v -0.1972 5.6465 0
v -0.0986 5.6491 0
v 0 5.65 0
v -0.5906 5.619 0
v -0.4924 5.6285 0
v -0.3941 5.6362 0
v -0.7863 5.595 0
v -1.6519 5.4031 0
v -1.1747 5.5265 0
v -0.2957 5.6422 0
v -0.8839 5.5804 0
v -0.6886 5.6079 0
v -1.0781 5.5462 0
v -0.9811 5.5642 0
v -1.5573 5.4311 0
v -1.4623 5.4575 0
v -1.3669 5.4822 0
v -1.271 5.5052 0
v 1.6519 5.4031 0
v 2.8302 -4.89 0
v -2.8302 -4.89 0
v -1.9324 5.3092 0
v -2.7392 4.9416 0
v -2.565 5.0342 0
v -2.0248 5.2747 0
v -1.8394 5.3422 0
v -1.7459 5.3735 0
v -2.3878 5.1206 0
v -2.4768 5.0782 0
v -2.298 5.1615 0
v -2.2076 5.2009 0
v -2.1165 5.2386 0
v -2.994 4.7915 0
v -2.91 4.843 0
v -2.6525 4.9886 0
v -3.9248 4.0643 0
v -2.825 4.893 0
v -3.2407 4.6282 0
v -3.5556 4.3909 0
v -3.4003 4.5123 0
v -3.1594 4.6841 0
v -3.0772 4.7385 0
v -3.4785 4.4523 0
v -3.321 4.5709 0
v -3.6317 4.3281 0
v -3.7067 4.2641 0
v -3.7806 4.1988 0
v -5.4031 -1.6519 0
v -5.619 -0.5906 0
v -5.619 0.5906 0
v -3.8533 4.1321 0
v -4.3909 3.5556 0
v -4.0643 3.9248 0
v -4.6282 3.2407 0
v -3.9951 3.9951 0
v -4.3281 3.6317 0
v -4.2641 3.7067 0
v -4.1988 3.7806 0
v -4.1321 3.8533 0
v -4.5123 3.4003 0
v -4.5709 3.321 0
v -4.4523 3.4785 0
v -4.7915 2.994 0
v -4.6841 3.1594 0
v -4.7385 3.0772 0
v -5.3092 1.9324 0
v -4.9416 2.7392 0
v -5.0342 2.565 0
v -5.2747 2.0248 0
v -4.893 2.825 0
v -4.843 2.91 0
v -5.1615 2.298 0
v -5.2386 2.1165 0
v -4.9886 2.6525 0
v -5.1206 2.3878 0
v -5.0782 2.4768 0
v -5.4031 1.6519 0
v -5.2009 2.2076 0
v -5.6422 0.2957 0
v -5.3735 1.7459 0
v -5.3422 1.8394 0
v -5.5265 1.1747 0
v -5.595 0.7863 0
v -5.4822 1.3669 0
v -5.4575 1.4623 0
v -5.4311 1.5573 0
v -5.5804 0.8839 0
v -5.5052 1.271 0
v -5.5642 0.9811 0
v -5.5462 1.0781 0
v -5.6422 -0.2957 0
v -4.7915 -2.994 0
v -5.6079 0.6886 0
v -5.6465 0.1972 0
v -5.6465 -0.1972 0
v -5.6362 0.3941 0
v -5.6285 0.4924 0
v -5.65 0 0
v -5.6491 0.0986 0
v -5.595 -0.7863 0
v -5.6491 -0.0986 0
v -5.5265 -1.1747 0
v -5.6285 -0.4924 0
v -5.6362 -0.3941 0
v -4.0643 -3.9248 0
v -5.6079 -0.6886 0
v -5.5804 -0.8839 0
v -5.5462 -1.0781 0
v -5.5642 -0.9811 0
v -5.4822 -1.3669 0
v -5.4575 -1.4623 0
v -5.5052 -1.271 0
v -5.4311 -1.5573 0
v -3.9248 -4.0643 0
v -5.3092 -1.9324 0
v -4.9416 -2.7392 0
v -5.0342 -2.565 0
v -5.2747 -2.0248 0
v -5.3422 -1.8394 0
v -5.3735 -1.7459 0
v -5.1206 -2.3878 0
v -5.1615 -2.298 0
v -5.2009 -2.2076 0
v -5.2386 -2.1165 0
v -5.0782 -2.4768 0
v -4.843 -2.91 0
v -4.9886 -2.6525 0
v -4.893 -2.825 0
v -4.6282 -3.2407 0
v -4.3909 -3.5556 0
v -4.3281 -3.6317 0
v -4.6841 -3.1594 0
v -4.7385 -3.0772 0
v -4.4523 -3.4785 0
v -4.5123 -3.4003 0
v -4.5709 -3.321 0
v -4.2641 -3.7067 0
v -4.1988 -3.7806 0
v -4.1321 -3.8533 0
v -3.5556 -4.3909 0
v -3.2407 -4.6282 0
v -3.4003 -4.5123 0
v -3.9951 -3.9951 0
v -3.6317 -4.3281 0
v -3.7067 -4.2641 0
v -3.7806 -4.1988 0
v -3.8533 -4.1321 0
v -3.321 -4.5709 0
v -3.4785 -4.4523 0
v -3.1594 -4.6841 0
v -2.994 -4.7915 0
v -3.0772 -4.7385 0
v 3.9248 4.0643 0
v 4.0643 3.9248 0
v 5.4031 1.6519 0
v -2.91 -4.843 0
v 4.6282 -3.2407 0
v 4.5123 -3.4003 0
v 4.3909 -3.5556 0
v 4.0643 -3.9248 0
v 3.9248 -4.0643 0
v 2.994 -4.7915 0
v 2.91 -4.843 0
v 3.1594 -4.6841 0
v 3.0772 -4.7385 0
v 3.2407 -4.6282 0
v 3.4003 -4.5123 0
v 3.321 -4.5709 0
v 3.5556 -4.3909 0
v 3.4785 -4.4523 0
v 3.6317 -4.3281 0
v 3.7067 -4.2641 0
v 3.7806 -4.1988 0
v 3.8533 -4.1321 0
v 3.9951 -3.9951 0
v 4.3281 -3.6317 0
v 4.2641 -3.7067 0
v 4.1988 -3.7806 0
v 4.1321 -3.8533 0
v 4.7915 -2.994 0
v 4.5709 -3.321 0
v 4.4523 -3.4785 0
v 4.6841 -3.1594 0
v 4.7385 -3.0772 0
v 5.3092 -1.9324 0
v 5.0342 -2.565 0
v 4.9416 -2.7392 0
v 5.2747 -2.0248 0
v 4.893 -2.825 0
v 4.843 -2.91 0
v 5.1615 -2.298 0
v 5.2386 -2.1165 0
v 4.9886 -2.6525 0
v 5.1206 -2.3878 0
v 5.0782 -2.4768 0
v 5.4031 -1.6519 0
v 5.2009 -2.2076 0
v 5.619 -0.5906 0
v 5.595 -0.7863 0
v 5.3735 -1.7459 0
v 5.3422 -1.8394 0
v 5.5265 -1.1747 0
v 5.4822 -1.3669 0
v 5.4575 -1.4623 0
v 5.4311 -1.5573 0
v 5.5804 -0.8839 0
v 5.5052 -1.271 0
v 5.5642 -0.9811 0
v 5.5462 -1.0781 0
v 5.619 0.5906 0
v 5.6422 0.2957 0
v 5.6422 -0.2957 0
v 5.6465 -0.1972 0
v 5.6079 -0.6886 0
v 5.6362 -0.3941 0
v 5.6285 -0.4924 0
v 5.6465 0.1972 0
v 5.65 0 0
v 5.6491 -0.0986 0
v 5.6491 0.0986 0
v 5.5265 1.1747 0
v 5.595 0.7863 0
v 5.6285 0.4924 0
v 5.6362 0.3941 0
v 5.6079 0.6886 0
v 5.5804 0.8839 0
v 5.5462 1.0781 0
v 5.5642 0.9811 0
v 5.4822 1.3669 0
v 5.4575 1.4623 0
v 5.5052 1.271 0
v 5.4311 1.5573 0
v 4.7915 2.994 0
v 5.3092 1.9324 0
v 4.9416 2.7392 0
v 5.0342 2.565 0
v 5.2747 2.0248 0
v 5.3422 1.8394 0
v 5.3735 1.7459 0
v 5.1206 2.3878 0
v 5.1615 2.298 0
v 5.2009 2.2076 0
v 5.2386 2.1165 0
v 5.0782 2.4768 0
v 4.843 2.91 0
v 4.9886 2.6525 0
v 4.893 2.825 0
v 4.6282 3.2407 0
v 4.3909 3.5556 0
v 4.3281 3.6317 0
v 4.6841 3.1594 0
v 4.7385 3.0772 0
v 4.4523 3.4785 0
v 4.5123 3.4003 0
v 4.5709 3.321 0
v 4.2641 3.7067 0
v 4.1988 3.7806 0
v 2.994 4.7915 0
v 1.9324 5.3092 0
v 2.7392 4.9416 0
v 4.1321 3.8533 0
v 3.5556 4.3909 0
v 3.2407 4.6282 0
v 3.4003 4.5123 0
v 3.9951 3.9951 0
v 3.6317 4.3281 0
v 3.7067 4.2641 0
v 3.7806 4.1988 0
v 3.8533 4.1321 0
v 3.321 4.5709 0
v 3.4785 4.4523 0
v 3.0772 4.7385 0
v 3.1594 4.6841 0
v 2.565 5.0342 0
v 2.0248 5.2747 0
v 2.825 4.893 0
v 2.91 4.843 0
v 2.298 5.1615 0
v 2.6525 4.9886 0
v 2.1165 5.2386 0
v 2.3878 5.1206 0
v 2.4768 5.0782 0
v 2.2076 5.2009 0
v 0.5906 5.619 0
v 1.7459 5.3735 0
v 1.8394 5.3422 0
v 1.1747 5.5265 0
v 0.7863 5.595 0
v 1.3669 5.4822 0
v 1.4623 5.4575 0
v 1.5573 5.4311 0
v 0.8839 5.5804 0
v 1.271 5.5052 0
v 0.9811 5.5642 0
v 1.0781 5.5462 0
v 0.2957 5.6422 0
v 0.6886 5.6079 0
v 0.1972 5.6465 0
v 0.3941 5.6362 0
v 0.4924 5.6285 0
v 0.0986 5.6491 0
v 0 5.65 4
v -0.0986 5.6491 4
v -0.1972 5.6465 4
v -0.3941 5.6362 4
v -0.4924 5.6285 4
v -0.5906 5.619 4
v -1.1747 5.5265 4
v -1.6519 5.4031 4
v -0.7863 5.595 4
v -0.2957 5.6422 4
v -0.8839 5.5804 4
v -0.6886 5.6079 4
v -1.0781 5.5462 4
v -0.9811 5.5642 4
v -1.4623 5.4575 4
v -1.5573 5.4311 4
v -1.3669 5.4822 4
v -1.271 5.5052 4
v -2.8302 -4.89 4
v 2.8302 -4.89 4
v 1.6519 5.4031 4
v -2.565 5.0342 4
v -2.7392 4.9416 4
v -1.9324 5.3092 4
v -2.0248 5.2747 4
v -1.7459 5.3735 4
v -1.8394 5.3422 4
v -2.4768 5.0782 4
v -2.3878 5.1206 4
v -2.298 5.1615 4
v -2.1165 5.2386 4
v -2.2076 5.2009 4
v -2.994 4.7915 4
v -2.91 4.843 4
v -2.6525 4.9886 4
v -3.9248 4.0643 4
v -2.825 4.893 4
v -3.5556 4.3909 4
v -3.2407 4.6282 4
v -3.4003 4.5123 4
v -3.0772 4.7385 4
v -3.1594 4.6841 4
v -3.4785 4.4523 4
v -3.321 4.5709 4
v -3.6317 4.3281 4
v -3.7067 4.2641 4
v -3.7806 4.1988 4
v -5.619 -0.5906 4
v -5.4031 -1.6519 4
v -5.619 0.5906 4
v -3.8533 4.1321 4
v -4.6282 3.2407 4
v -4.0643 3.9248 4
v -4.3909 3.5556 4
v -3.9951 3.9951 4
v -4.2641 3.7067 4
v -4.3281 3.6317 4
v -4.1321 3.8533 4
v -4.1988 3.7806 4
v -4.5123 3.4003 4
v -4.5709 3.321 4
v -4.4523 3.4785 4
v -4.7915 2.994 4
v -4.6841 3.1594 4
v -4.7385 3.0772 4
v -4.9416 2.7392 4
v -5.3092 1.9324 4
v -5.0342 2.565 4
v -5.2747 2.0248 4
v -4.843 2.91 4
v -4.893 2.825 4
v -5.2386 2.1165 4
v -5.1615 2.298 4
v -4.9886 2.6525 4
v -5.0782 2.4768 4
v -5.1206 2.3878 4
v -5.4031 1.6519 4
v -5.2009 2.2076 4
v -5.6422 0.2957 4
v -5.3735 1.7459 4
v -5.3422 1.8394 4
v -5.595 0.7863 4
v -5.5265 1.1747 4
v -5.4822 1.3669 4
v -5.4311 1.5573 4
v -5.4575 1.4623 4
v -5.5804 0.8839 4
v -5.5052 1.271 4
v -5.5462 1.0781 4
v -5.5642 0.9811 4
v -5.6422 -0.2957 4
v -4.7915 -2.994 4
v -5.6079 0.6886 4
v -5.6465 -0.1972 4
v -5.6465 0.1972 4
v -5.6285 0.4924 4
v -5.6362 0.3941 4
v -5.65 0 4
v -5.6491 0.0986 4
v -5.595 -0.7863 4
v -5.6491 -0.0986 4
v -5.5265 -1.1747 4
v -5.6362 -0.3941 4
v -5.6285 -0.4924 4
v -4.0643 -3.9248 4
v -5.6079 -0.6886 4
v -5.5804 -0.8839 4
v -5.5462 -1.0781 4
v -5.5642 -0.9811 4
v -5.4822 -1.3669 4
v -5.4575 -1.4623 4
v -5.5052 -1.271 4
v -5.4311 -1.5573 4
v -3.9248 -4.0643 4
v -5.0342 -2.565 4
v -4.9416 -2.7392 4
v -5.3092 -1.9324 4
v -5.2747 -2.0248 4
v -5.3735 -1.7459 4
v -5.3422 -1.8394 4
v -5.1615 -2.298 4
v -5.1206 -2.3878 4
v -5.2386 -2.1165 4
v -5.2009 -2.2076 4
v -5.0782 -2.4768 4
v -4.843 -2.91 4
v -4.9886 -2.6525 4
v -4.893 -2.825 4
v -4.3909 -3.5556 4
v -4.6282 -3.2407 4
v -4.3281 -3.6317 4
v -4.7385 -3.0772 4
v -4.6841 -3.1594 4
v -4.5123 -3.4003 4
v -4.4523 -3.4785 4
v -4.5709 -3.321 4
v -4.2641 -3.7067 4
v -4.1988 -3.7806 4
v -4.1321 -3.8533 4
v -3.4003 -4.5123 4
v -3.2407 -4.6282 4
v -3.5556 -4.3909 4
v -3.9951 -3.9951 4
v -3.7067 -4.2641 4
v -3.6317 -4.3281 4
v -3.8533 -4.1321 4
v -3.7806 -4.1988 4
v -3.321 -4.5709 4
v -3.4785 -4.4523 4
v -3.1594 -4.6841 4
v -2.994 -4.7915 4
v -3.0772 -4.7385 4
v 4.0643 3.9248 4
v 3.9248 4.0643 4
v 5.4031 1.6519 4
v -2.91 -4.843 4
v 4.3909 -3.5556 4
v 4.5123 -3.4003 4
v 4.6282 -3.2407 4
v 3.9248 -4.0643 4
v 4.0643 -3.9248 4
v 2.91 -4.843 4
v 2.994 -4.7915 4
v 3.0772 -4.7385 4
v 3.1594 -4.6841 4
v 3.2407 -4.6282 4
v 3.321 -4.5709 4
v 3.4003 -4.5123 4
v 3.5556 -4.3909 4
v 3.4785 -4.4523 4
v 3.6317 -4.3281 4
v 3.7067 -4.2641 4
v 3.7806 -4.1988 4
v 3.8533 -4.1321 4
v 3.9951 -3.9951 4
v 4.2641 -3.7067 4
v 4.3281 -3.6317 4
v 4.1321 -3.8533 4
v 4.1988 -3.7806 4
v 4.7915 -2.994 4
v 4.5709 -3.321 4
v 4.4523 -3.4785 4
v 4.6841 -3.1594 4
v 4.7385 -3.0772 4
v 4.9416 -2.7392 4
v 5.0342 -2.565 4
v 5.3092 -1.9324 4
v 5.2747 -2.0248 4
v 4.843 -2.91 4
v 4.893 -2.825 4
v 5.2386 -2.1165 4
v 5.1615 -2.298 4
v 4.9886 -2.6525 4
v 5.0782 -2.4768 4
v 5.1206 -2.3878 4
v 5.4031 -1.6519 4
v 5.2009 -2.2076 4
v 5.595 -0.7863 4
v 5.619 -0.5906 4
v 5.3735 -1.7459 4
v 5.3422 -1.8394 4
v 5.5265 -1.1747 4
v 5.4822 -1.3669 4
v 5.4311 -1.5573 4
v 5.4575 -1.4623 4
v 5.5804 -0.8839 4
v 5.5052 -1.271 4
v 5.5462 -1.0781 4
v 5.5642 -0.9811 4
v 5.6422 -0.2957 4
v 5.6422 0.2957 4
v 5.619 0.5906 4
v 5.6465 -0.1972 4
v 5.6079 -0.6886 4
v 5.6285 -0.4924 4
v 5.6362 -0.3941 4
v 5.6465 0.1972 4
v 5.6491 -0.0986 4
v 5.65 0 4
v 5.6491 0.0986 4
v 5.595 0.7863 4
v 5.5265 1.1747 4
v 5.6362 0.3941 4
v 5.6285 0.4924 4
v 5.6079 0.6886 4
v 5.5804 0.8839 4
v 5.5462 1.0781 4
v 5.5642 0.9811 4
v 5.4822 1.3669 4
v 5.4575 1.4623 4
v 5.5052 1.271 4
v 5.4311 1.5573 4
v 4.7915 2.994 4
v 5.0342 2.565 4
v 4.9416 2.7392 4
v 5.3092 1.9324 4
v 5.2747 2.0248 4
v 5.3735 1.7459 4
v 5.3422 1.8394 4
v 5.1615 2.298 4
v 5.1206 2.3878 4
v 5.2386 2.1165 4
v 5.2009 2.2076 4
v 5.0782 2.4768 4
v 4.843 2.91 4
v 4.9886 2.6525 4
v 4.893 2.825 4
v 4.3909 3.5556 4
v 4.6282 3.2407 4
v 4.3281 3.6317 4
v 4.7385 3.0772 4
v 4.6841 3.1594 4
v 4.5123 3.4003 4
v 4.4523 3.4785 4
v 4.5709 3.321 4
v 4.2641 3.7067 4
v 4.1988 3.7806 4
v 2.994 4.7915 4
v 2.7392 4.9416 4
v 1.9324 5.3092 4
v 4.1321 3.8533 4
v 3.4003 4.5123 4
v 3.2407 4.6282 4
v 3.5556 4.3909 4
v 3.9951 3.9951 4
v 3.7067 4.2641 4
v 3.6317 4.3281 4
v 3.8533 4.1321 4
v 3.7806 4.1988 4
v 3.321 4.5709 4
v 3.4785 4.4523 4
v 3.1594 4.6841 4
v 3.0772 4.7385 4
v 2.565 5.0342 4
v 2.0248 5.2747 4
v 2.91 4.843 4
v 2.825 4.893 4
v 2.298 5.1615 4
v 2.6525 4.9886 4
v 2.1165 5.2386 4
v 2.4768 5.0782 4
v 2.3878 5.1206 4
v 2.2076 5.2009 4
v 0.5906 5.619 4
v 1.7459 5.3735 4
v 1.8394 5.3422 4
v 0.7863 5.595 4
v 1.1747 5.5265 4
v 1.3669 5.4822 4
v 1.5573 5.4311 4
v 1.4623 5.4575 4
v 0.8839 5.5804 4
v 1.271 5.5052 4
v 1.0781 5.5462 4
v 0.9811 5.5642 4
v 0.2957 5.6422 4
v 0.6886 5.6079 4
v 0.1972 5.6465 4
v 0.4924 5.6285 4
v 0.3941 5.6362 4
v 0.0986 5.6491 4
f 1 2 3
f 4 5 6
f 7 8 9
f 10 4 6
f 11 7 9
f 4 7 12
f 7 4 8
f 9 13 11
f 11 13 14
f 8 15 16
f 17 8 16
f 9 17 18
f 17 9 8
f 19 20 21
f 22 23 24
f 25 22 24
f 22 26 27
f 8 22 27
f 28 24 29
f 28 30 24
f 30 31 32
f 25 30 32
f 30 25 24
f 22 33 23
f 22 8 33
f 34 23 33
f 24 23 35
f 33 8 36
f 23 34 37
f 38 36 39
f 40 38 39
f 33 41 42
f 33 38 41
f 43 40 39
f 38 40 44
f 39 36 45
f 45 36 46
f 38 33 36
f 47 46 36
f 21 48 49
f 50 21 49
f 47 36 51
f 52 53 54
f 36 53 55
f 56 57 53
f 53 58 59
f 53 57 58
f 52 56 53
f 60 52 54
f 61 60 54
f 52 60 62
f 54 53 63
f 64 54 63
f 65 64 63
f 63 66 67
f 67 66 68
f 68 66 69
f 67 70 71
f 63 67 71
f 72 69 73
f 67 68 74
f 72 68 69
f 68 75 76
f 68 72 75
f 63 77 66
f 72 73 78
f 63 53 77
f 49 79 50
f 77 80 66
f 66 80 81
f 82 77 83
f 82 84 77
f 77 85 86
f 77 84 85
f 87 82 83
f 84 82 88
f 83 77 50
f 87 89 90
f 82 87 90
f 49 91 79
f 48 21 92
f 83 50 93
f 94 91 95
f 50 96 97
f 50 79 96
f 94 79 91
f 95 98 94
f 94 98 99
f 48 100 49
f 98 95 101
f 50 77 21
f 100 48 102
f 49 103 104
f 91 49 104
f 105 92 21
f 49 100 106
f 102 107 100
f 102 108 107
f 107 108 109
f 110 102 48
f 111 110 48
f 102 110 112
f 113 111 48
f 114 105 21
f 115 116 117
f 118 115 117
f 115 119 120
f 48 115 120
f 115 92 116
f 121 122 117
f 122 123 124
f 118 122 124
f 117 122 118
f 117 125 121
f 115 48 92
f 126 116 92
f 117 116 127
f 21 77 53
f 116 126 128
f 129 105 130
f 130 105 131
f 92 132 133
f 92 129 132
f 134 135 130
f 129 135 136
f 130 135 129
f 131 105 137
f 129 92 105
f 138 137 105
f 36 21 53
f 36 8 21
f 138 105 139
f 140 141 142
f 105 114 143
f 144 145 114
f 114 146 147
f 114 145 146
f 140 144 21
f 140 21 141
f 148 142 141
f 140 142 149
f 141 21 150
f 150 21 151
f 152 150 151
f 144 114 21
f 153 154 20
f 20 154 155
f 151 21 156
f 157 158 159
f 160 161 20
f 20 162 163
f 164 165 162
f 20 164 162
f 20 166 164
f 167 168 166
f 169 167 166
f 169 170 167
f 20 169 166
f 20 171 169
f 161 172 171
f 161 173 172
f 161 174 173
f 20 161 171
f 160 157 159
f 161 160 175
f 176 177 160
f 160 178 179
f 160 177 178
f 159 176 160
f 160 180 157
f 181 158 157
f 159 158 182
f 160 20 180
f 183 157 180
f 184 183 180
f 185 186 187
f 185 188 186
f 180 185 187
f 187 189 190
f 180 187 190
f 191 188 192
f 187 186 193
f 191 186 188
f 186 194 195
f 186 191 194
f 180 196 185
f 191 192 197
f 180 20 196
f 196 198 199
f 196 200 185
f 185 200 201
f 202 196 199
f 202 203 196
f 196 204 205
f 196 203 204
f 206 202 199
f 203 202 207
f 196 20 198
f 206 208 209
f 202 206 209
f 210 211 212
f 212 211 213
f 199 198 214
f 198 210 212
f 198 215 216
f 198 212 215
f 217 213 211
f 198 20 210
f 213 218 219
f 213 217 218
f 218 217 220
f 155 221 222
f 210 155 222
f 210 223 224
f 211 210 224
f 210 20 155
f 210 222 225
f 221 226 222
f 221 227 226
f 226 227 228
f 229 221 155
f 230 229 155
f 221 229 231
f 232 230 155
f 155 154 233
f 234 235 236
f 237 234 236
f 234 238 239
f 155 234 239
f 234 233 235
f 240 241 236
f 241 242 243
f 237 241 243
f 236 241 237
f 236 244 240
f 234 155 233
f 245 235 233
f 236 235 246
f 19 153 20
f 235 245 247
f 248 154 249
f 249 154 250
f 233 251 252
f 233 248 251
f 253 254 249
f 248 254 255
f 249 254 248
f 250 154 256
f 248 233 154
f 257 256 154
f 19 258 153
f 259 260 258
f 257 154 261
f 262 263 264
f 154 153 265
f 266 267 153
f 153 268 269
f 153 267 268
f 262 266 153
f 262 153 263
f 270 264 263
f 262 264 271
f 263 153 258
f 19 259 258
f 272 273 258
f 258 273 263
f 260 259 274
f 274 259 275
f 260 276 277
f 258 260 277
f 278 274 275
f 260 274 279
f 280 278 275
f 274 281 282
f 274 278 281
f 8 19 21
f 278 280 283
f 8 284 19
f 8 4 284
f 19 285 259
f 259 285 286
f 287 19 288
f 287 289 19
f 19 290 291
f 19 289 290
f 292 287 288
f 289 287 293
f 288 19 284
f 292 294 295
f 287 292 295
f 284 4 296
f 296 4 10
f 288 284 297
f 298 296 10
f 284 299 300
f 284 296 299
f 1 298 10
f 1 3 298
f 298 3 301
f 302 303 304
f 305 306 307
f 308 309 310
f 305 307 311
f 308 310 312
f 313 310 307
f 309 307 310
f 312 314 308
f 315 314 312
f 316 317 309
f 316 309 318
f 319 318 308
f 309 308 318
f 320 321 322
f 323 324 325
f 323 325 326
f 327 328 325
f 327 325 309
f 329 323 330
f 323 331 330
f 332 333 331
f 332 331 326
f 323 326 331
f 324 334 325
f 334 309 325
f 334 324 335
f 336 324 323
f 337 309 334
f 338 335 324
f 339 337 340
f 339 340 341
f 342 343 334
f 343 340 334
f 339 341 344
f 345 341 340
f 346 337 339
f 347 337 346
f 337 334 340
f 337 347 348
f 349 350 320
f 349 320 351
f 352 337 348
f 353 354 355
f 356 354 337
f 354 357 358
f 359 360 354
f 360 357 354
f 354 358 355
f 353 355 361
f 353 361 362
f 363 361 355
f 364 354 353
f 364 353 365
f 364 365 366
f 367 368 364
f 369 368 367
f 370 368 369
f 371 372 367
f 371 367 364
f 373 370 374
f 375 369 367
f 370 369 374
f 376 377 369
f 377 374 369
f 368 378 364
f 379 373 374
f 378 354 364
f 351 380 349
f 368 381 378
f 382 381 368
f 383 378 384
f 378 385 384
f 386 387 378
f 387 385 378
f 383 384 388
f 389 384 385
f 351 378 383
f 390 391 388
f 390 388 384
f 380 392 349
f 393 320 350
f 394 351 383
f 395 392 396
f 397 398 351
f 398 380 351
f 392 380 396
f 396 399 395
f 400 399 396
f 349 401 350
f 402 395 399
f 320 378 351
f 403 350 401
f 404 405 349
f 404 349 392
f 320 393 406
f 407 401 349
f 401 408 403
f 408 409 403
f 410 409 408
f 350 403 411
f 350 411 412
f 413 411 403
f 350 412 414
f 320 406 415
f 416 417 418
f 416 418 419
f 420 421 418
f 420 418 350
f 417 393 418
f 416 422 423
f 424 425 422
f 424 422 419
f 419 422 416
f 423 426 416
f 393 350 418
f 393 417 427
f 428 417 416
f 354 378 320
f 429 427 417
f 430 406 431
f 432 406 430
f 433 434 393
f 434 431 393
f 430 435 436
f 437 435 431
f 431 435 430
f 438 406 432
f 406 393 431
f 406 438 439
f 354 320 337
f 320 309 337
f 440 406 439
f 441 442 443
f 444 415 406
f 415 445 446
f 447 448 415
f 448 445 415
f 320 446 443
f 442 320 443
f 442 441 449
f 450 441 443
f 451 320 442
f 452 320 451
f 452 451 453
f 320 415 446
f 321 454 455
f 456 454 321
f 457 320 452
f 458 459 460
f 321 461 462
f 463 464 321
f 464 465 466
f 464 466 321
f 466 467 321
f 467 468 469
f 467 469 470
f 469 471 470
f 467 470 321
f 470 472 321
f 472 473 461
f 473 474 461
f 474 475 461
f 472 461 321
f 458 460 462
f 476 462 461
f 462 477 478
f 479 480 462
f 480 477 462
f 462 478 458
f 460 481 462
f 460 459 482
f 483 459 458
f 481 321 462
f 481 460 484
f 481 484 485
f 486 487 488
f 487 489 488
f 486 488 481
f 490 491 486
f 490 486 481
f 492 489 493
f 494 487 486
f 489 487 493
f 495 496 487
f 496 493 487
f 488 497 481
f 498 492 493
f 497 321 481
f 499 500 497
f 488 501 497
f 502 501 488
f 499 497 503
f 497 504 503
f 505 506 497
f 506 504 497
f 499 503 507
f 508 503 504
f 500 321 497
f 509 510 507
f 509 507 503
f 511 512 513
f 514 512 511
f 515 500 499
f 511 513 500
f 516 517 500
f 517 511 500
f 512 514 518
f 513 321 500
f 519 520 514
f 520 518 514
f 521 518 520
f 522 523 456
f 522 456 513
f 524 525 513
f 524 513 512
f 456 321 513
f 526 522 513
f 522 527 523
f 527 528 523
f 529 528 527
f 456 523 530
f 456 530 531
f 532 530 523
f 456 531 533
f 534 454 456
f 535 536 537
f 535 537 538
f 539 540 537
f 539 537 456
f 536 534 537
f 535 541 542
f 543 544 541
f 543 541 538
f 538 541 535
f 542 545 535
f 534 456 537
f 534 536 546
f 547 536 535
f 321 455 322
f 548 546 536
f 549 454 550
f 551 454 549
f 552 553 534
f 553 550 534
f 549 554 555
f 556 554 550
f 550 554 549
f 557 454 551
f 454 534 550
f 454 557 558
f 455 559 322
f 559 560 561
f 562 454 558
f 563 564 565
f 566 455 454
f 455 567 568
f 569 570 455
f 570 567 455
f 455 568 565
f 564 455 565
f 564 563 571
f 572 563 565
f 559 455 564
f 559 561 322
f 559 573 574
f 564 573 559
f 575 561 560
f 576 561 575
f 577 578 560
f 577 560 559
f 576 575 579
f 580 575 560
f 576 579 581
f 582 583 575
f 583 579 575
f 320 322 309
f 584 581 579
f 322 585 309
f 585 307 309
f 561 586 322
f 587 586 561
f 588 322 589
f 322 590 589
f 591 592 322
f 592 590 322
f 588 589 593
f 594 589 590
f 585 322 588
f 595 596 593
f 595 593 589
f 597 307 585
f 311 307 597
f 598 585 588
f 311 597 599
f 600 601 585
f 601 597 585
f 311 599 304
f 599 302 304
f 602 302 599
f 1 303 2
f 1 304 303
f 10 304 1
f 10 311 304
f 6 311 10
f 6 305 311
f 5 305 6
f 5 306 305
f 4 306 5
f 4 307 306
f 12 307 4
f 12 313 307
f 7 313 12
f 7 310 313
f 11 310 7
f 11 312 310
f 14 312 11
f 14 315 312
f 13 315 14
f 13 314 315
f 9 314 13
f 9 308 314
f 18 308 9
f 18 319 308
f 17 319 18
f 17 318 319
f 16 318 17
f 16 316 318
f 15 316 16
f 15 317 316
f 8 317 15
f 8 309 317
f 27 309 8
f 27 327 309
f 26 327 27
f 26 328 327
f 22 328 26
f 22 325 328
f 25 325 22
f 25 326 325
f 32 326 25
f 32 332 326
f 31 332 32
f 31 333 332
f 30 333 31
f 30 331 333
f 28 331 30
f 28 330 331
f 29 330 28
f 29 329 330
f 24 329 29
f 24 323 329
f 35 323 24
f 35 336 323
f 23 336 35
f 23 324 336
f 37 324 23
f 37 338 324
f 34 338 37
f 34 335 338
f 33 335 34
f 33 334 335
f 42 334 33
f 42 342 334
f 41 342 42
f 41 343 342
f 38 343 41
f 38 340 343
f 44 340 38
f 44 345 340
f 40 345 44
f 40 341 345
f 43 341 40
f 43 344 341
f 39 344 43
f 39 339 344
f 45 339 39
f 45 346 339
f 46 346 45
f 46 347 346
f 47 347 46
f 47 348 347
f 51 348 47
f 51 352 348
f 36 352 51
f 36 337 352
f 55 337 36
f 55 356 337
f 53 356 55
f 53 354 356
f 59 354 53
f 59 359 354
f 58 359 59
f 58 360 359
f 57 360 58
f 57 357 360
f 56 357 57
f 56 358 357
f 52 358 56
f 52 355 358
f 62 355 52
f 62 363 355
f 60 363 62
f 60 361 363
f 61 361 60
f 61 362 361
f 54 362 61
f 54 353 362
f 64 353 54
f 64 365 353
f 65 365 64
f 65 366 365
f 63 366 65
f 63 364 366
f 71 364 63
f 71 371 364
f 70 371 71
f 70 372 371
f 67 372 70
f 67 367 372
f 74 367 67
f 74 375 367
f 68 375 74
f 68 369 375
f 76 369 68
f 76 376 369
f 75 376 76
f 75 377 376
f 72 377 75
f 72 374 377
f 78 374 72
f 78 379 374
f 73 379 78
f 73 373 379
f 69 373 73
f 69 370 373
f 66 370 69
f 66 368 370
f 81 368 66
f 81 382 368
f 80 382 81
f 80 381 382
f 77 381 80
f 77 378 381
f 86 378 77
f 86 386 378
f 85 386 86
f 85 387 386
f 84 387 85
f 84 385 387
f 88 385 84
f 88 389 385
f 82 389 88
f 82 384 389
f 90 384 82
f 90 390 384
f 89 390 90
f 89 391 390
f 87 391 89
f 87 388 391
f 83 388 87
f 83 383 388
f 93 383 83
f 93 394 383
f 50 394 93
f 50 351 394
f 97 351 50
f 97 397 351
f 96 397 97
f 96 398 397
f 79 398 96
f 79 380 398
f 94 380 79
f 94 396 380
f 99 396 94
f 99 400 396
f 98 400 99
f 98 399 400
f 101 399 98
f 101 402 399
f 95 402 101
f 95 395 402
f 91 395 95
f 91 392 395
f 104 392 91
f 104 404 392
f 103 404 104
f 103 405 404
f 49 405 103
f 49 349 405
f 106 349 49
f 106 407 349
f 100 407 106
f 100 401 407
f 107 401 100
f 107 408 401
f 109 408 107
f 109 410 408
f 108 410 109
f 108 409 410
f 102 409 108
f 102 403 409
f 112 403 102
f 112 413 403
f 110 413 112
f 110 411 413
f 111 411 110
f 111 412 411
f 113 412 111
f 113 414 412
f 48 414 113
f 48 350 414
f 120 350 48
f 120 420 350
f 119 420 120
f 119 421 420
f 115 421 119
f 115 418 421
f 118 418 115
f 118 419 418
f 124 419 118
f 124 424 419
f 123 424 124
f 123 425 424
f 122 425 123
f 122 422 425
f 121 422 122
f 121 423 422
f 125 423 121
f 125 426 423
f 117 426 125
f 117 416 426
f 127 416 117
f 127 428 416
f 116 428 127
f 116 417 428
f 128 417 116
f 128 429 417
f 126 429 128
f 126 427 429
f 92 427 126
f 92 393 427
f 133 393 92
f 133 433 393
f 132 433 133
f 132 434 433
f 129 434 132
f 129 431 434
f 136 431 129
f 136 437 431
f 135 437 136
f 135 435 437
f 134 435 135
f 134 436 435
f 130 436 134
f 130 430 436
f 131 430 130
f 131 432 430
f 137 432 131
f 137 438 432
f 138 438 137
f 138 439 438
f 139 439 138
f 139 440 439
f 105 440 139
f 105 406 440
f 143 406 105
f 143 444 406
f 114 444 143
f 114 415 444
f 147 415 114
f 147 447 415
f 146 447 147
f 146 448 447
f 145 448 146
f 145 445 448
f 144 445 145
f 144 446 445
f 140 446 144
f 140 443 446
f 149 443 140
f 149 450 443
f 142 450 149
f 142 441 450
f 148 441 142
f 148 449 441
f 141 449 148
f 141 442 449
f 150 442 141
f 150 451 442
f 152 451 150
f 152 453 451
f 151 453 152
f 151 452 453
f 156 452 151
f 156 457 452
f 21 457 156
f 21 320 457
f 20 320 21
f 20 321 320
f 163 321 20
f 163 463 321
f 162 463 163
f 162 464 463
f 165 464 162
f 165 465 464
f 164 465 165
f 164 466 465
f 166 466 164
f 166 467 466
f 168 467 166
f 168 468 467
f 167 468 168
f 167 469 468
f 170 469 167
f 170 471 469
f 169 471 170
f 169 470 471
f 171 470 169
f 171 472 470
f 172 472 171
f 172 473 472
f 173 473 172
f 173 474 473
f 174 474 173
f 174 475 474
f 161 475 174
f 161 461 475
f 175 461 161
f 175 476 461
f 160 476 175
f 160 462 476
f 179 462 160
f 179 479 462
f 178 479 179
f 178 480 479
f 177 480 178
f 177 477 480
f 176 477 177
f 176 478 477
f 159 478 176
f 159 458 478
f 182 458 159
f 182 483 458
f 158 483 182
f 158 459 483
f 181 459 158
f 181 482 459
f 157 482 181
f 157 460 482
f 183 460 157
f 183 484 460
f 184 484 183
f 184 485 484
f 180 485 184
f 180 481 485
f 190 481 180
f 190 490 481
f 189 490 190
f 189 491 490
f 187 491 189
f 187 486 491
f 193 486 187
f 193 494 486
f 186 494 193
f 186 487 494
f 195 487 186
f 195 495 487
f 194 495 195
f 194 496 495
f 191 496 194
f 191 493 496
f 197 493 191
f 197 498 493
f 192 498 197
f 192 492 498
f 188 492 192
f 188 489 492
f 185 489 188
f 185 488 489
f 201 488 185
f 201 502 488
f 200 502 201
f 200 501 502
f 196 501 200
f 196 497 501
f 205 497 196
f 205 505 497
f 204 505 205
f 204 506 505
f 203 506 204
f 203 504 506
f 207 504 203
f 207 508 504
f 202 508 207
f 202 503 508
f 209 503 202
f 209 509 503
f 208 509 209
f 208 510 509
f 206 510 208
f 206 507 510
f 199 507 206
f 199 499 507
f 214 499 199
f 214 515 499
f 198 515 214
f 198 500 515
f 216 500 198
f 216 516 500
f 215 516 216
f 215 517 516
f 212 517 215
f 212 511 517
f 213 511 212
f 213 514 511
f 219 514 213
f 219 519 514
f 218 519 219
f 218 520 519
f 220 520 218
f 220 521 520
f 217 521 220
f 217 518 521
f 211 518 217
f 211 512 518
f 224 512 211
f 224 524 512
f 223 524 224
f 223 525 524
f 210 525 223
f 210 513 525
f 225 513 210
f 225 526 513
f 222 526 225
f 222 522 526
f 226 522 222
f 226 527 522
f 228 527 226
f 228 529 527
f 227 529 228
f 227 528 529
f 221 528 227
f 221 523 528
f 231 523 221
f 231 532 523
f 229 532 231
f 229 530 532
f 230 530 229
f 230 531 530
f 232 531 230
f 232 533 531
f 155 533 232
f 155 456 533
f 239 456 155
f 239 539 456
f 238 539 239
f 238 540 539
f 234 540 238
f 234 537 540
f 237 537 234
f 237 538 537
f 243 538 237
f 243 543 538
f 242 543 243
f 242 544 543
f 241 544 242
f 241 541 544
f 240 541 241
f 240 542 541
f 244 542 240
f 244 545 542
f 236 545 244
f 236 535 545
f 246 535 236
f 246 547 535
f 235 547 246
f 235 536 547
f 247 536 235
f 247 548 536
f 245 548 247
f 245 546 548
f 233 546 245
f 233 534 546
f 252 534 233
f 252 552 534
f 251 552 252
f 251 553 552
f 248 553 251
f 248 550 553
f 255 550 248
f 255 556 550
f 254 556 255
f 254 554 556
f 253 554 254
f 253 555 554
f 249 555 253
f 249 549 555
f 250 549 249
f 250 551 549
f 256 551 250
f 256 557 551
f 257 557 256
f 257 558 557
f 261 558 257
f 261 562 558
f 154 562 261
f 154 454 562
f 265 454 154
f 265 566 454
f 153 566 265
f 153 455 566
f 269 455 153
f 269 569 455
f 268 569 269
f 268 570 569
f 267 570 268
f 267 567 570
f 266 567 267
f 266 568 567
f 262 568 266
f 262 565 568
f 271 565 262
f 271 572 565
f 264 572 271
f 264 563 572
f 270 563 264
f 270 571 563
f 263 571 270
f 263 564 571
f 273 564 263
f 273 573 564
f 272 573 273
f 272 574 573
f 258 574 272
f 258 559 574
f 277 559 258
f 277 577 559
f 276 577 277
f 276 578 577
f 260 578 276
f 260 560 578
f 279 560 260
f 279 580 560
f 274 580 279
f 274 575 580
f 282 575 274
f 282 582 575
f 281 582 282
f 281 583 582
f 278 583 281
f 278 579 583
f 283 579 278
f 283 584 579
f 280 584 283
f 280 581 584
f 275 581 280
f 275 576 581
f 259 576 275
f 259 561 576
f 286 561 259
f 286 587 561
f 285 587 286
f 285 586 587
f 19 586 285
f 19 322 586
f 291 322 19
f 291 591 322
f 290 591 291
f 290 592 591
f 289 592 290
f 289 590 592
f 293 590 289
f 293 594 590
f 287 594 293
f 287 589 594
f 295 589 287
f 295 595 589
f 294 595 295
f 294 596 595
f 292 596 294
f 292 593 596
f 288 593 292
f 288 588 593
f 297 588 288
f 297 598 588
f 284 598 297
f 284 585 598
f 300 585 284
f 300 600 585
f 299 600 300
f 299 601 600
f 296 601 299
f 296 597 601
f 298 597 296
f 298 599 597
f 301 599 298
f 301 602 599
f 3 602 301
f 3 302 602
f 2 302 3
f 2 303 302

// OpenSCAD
// LibFile: unfy_dhole.scad
//   UnfyOpenSCADLib Copyright Leif Burrow 2026
//   kc8rwr@unfy.us
//   unforgettability.net
//   .
//   This file is part of UnfyOpenSCADLib.
//   .
//   unfy_dhole contains a module for creating D, double-D and round holes for mounting panel components such as fuse holders, toggle switches, potentiometers, etc...

//diameter of full circle
diameter = 11.3;

//single - measurement from flat to opposite diameter, double - measurement from flat to flat
flat_width = 10.54;

//shape
shape = "D"; //["D", "DoubleD", "Circle"]

//rotation angle, 0 is flat on top, rotates counter-clockwise
angle = 0; //[0:360]

//depth of hole to make
z = 4;

$unf_over = 0.01;
$fn = $preview ? 36 : 360;

use <../unfy_lists.scad>

// Module: unf_dHole
// Usage:
//   unf_dHole(&lt;args&gt;);
// Description:
//   Creates d, double-d and circle shapes for cutouts such as fuse holder, toggle switch, etc.. mounts.
//   Reason for circle (which could obviously be done without this) is to make easy user-customization, the shape may be passed straight through from a customizer drop-down.
// Arguments:
//   ---
//   diameter = diameter of the fully round part of the circle (11.3)
//   flat_width = for a d-shape, distance from flat to opposite side of circle. For a double-d, distance between flats. Ignored for a circle. (10.54)
//   angle = rotation angle, 0 is flat on top, rotates counter-clockwise (0)
//   z = depth of hole to make (4)
//   shape = "d", "doubled" or "circle", case insensitive (d)
// Figure(Spin;VPD=50;NoAxes): defaults
//   $unf_over = 0.01;
//   $fn = 36;
//   use <cutouts/unfy_dhole.scad>;
//   unf_dHole();
// Figure(Spin;VPD=50;NoAxes): shape="DoubleD", flat_width=8
//   $unf_over = 0.01;
//   $fn = 36;
//   use <cutouts/unfy_dhole.scad>;
//   unf_dHole(shape="DoubleD", flat_width=8);
// Figure(Spin;VPD=50;NoAxes): shape="circle"
//   $unf_over = 0.01;
//   $fn = 36;
//   use <cutouts/unfy_dhole.scad>;
//   unf_dHole(shape="circle");
module unf_dHole(diameter=11.3, flat_width=10.54, angle=0, z=4, shape="d"){
  let (shape = unf_stToLower(shape)){
    assert ("d" == shape || "doubled" == shape || "circle" == shape, "Shape must be one of 'd', 'doubled' or 'circle'.");
    assert (0 < diameter, "Diameter must be greater than 0.");
    assert (shape == "circle" || 0 < flat_width, "Flat_width must be greater than zero.");
    assert (shape == "circle" || flat_width < diameter, "Flat_width must be less than diameter.");
    linear_extrude(z){
      rotate(180+angle){
	intersection(){
	  circle(d = diameter);
	  if ("circle" != shape){
	    translate([-diameter/2, -flat_width/2 - (("doubled"==shape)?0:(diameter-flat_width)/2) , 0]){
	      square([diameter, flat_width]);
	    }
	  }
	}
      }
    }
  }
}

unf_dHole(diameter=diameter, flat_width=flat_width, angle=angle, z=z, shape=shape);

// Section: Licensing
//   UnfyOpenSCADLib is free software: you can redistribute it and/or modify it under the terms of the
//   GNU General Public License as published by the Free Software Foundation, either version 3 of
//   the License, or (at your option) any later version.
//   .
//   UnfyOpenSCADLib is distributed in the hope that it will be useful, but WITHOUT ANY WARRANTY;
//   without even the implied warranty of MERCHANTABILITY or FITNESS FOR A PARTICULAR PURPOSE.
//   See the GNU General Public License for more details.
//   .
//   You should have received a copy of the GNU General Public License along with UnfyOpenSCADLib.
//   If not, see <https://www.gnu.org/licenses/>.
//   
